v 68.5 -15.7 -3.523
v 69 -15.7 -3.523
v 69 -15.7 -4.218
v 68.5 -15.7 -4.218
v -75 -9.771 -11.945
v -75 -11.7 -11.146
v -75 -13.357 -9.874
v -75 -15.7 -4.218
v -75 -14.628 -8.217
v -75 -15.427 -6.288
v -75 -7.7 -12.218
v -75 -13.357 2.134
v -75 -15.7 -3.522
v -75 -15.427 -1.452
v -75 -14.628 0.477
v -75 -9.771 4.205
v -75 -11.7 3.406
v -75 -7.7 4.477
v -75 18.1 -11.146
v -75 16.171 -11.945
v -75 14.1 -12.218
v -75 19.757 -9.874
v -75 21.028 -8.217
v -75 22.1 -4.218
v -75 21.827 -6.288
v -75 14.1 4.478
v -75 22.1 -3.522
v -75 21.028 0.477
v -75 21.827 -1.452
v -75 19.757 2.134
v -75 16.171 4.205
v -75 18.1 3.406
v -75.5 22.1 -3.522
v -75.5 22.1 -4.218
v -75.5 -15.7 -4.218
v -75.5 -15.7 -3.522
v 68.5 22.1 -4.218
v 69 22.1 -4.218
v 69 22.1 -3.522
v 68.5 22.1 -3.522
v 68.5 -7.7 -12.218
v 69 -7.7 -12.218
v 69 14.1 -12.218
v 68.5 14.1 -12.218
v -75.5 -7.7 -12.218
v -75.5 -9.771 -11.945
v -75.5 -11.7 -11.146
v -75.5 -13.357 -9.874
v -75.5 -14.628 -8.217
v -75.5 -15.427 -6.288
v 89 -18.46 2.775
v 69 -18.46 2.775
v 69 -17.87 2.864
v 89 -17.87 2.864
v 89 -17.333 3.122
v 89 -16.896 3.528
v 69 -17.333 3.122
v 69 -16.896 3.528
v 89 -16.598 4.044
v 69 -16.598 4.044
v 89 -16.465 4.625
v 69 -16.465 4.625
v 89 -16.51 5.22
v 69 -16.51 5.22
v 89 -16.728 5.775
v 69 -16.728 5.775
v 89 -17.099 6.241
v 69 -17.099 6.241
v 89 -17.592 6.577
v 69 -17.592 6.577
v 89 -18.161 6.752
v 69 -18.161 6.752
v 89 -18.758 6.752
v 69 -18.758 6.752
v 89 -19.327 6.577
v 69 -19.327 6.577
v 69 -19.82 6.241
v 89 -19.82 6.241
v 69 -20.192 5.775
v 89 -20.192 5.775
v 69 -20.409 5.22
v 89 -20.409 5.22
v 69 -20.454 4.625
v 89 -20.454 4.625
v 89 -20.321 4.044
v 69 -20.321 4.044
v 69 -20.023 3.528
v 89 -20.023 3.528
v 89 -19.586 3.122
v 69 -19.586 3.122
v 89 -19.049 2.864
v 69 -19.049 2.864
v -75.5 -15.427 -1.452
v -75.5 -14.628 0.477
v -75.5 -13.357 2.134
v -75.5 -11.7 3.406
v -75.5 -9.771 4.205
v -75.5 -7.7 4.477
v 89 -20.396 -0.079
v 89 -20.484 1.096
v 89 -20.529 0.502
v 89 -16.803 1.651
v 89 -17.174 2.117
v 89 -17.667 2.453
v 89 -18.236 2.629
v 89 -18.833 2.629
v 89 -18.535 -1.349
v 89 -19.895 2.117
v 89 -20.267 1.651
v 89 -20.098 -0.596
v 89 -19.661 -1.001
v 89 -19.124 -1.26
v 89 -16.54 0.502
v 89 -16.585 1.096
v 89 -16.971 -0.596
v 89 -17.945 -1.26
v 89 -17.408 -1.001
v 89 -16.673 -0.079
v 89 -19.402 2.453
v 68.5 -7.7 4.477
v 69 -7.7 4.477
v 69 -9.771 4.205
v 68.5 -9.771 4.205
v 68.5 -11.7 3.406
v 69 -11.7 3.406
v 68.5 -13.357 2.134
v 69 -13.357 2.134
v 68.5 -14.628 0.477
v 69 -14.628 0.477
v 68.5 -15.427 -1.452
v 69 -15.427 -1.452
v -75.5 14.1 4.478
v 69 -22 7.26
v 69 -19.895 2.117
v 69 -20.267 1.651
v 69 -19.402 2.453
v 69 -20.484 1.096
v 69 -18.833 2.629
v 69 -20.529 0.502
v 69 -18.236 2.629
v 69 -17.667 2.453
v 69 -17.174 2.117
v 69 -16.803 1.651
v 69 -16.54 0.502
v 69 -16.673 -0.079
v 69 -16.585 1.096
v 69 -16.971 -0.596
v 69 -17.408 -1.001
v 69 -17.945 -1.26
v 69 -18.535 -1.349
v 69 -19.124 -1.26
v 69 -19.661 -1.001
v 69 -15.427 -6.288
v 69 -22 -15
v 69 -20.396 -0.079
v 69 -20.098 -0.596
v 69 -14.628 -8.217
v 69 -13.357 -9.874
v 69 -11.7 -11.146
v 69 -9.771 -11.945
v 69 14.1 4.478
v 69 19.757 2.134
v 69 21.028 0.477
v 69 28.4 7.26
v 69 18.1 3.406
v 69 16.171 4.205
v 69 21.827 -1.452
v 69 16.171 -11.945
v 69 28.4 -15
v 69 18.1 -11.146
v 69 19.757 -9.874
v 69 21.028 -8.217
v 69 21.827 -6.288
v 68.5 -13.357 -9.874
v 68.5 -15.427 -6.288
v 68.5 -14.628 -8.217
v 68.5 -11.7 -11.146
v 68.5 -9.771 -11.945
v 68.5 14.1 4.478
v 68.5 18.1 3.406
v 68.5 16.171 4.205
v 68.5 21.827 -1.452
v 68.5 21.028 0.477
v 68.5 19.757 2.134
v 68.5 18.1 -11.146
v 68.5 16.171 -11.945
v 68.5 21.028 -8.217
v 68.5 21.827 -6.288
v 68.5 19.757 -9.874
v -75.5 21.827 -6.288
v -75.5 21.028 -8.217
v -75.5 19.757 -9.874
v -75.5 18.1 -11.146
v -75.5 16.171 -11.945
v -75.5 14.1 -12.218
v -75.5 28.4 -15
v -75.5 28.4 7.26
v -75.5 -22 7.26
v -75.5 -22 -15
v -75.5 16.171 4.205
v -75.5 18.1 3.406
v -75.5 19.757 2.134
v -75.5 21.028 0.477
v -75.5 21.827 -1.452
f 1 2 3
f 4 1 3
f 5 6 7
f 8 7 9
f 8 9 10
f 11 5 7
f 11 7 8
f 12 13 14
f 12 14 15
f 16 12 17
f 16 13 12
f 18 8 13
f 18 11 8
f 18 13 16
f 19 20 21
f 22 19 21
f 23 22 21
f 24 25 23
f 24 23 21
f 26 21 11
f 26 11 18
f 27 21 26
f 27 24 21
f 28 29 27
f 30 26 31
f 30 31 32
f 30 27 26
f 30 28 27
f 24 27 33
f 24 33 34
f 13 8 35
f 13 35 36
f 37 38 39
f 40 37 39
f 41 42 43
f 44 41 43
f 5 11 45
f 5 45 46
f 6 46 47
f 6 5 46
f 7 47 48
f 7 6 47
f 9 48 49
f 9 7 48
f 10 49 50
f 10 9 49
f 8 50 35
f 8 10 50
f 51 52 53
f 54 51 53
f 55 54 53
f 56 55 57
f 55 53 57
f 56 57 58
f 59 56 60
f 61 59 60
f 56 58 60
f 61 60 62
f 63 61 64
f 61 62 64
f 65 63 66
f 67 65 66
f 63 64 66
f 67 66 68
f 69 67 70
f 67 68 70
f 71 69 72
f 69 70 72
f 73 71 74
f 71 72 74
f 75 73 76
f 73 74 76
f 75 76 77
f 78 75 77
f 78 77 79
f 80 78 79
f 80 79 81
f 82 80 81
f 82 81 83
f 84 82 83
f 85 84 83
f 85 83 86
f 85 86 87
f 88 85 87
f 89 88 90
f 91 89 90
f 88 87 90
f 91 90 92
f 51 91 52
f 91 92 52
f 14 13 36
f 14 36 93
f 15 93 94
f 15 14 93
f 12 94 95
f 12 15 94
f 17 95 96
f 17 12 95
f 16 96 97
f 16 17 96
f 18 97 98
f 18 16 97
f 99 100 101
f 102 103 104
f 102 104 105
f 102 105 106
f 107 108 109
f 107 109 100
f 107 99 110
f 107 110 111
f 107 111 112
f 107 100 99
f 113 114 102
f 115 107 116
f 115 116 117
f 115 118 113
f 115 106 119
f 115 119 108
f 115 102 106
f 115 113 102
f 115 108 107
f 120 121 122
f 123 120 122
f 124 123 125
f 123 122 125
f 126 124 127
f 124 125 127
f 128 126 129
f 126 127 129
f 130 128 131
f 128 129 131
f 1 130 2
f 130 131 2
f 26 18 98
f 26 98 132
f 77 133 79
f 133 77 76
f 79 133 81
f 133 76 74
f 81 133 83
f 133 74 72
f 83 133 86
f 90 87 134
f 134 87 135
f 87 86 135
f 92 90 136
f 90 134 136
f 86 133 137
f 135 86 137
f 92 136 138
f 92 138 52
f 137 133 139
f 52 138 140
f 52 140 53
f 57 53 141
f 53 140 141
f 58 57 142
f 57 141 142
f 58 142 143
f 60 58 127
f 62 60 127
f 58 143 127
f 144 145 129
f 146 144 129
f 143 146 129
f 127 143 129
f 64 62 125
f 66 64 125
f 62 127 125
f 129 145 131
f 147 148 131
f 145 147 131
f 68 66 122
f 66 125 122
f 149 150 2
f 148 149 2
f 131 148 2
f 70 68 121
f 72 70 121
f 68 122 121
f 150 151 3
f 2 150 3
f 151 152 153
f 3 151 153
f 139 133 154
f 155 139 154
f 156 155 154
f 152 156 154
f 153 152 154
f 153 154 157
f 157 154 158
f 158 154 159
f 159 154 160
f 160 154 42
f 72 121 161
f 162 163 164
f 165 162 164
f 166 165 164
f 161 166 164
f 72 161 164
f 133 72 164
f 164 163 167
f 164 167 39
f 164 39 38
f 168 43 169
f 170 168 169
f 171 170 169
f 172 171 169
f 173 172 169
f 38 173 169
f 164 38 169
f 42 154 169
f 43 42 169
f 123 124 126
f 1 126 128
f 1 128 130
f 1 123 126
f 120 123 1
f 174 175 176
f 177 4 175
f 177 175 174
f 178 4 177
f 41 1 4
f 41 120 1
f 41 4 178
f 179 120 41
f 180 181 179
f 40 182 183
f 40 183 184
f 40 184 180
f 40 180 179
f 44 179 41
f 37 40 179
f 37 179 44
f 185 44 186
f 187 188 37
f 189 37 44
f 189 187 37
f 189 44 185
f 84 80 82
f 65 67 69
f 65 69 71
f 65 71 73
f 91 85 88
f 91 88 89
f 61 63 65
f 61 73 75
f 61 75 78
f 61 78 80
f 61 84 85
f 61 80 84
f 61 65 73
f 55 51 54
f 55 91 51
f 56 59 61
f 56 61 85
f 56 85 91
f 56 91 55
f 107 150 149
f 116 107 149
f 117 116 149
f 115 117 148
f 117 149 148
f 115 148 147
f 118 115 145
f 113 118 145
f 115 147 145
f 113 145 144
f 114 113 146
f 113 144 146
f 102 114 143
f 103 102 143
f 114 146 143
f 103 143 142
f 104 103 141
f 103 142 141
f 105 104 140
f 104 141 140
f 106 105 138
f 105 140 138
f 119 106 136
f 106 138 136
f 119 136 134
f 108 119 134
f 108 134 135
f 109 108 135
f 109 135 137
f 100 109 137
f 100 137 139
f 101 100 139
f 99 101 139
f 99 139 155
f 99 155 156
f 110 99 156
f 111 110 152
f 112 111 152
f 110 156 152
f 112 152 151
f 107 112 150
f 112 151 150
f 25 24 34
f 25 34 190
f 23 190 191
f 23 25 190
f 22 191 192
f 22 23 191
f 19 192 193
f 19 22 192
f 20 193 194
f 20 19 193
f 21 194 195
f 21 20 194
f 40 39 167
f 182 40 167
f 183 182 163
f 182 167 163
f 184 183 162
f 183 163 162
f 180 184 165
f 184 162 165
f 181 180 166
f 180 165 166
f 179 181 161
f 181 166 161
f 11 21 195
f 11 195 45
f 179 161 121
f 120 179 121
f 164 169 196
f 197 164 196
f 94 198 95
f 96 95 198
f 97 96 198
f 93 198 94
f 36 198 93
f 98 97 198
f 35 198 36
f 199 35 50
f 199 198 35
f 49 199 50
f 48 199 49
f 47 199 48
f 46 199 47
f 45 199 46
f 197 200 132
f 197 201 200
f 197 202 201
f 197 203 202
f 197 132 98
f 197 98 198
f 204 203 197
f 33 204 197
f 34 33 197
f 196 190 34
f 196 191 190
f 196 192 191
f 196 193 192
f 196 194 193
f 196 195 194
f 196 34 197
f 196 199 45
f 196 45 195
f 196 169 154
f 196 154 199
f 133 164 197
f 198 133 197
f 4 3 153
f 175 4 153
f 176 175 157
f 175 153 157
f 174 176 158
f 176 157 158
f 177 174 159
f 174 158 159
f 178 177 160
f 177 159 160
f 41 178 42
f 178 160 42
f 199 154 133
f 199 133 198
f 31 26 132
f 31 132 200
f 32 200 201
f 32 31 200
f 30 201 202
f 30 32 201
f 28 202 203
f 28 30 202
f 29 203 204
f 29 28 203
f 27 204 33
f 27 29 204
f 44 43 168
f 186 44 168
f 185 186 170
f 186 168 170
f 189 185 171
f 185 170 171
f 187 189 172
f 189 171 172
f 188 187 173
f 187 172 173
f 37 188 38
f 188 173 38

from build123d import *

# Parameters (mm, degrees)
SKETCH1_W           = 144.5
SKETCH1_H           = 50.4
BOSS_EXTRUDE1_DEPTH = 22.26
CUT_EXTRUDE1_DEPTH  = 0.5
CUT_EXTRUDE2_START  = -0.5
CUT_EXTRUDE2_DEPTH  = 0.5
SKETCH5_R           = 2
BOSS_EXTRUDE2_DEPTH = 20
SKETCH6_R           = 2
BOSS_EXTRUDE3_DEPTH = 20


with BuildPart() as part:
    # Sketch1 → Boss-Extrude1 (new body)
    with BuildSketch(Plane(origin=(0, 0, -15), x_dir=(-1, 0, 0), z_dir=(0, 0, -1))):
        with Locations((3.25, 3.2)):
            Rectangle(SKETCH1_W, SKETCH1_H)
    extrude(amount=-BOSS_EXTRUDE1_DEPTH)

    # Sketch2 → Cut-Extrude1 (cut)
    with BuildSketch(Plane(origin=(69, 0, 0), x_dir=(0, 0, -1), z_dir=(1, 0, 0))):
        with BuildLine():
            Line((-4.4775, 14.1), (-4.4775, -7.7))
            ThreePointArc((-4.4775, -7.7), (-2.134354249, -13.356854249), (3.5225, -15.7))
            Line((3.5225, -15.7), (4.2175, -15.7))
            ThreePointArc((4.2175, -15.7), (9.874354249, -13.356854249), (12.2175, -7.7))
            Line((12.2175, -7.7), (12.2175, 14.1))
            ThreePointArc((12.2175, 14.1), (9.874354249, 19.756854249), (4.2175, 22.1))
            Line((4.2175, 22.1), (3.5225, 22.1))
            ThreePointArc((3.5225, 22.1), (-2.134354249, 19.756854249), (-4.4775, 14.1))
        make_face()
    extrude(amount=-CUT_EXTRUDE1_DEPTH, mode=Mode.SUBTRACT)

    # Sketch3 → Cut-Extrude2 (cut)
    with BuildSketch(Plane.ZY.offset(75.5).offset(CUT_EXTRUDE2_START)):
        with BuildLine():
            Line((-3.5225, 22.1), (-4.2175, 22.1))
            ThreePointArc((-4.2175, 22.1), (-9.874354249, 19.756854249), (-12.2175, 14.1))
            Line((-12.2175, 14.1), (-12.2175, -7.7))
            ThreePointArc((-12.2175, -7.7), (-9.874354249, -13.356854249), (-4.2175, -15.7))
            Line((-4.2175, -15.7), (-3.5225, -15.7))
            ThreePointArc((-3.5225, -15.7), (2.134354249, -13.356854249), (4.4775, -7.7))
            Line((4.4775, -7.7), (4.4775, 14.1))
            ThreePointArc((4.4775, 14.1), (2.134354249, 19.756854249), (-3.5225, 22.1))
        make_face()
    extrude(amount=CUT_EXTRUDE2_DEPTH, mode=Mode.SUBTRACT)

    # Sketch5 → Boss-Extrude2 (add)
    with BuildSketch(Plane(origin=(69, 0, 0), x_dir=(0, 0, -1), z_dir=(1, 0, 0))):
        with Locations((-0.651385293, -18.534553966)):
            Circle(SKETCH5_R)
    extrude(amount=BOSS_EXTRUDE2_DEPTH)

    # Sketch6 → Boss-Extrude3 (add)
    with BuildSketch(Plane(origin=(69, 0, 0), x_dir=(0, 0, -1), z_dir=(1, 0, 0))):
        with Locations((-4.774830425, -18.459565293)):
            Circle(SKETCH6_R)
    extrude(amount=BOSS_EXTRUDE3_DEPTH)


solid = part.part
